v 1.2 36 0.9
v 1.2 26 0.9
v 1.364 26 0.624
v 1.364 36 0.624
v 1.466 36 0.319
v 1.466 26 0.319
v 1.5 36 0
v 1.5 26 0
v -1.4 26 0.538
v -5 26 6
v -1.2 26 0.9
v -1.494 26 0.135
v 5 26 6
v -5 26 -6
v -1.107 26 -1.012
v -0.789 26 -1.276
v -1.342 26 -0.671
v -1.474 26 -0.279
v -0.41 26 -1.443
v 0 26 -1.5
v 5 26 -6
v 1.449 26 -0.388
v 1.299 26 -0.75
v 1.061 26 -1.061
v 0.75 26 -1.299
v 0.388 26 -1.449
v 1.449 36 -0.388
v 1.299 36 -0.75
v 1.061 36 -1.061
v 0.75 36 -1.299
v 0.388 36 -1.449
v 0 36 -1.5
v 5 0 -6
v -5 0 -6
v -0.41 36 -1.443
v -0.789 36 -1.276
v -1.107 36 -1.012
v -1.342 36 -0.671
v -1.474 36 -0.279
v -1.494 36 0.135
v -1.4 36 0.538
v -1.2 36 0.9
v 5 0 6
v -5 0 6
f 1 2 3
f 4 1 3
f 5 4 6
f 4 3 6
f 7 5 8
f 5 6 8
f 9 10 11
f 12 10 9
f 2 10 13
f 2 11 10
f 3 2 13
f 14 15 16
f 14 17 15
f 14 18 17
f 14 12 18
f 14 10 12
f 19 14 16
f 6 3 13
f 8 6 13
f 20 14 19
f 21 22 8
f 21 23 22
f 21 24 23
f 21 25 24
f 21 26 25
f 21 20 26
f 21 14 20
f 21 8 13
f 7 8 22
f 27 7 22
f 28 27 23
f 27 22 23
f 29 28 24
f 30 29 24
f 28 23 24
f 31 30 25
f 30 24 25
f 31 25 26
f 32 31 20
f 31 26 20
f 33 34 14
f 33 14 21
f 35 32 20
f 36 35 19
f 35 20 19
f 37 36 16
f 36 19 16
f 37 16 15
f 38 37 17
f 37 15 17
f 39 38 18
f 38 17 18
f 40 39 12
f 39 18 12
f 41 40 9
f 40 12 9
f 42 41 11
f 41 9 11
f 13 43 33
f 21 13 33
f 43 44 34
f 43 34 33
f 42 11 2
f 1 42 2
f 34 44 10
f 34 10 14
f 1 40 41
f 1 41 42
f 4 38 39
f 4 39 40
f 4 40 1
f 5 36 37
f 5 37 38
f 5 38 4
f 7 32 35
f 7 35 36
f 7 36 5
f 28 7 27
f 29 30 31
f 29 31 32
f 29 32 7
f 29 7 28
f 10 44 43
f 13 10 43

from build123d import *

# Parameters (mm, degrees)
SKETCH2_W           = 10
SKETCH2_H           = 12
BOSS_EXTRUDE1_DEPTH = 26
BOSS_EXTRUDE2_DEPTH = 10


with BuildPart() as part:
    # Sketch2 → Boss-Extrude1 (new body)
    with BuildSketch(Plane(origin=(0, 0, 0), x_dir=(1, 0, 0), z_dir=(0, 1, 0))):
        Rectangle(SKETCH2_W, SKETCH2_H)
    extrude(amount=BOSS_EXTRUDE1_DEPTH)

    # Sketch3 → Boss-Extrude2 (add)
    with BuildSketch(Plane(origin=(0, 26, 0), x_dir=(1, 0, 0), z_dir=(0, 1, 0))):
        with BuildLine():
            ThreePointArc((1.5, 0), (1.060660172, 1.060660172), (0, 1.5))
            Line((0, 1.5), (0, -0.9))
            Line((0, -0.9), (1.2, -0.9))
            ThreePointArc((1.2, -0.9), (1.423024947, -0.474341649), (1.5, 0))
        make_face()
        with BuildLine():
            Line((0, -0.9), (0, 1.5))
            ThreePointArc((0, 1.5), (-1.341640786, 0.670820393), (-1.2, -0.9))
            Line((-1.2, -0.9), (0, -0.9))
        make_face()
    extrude(amount=BOSS_EXTRUDE2_DEPTH)


solid = part.part
